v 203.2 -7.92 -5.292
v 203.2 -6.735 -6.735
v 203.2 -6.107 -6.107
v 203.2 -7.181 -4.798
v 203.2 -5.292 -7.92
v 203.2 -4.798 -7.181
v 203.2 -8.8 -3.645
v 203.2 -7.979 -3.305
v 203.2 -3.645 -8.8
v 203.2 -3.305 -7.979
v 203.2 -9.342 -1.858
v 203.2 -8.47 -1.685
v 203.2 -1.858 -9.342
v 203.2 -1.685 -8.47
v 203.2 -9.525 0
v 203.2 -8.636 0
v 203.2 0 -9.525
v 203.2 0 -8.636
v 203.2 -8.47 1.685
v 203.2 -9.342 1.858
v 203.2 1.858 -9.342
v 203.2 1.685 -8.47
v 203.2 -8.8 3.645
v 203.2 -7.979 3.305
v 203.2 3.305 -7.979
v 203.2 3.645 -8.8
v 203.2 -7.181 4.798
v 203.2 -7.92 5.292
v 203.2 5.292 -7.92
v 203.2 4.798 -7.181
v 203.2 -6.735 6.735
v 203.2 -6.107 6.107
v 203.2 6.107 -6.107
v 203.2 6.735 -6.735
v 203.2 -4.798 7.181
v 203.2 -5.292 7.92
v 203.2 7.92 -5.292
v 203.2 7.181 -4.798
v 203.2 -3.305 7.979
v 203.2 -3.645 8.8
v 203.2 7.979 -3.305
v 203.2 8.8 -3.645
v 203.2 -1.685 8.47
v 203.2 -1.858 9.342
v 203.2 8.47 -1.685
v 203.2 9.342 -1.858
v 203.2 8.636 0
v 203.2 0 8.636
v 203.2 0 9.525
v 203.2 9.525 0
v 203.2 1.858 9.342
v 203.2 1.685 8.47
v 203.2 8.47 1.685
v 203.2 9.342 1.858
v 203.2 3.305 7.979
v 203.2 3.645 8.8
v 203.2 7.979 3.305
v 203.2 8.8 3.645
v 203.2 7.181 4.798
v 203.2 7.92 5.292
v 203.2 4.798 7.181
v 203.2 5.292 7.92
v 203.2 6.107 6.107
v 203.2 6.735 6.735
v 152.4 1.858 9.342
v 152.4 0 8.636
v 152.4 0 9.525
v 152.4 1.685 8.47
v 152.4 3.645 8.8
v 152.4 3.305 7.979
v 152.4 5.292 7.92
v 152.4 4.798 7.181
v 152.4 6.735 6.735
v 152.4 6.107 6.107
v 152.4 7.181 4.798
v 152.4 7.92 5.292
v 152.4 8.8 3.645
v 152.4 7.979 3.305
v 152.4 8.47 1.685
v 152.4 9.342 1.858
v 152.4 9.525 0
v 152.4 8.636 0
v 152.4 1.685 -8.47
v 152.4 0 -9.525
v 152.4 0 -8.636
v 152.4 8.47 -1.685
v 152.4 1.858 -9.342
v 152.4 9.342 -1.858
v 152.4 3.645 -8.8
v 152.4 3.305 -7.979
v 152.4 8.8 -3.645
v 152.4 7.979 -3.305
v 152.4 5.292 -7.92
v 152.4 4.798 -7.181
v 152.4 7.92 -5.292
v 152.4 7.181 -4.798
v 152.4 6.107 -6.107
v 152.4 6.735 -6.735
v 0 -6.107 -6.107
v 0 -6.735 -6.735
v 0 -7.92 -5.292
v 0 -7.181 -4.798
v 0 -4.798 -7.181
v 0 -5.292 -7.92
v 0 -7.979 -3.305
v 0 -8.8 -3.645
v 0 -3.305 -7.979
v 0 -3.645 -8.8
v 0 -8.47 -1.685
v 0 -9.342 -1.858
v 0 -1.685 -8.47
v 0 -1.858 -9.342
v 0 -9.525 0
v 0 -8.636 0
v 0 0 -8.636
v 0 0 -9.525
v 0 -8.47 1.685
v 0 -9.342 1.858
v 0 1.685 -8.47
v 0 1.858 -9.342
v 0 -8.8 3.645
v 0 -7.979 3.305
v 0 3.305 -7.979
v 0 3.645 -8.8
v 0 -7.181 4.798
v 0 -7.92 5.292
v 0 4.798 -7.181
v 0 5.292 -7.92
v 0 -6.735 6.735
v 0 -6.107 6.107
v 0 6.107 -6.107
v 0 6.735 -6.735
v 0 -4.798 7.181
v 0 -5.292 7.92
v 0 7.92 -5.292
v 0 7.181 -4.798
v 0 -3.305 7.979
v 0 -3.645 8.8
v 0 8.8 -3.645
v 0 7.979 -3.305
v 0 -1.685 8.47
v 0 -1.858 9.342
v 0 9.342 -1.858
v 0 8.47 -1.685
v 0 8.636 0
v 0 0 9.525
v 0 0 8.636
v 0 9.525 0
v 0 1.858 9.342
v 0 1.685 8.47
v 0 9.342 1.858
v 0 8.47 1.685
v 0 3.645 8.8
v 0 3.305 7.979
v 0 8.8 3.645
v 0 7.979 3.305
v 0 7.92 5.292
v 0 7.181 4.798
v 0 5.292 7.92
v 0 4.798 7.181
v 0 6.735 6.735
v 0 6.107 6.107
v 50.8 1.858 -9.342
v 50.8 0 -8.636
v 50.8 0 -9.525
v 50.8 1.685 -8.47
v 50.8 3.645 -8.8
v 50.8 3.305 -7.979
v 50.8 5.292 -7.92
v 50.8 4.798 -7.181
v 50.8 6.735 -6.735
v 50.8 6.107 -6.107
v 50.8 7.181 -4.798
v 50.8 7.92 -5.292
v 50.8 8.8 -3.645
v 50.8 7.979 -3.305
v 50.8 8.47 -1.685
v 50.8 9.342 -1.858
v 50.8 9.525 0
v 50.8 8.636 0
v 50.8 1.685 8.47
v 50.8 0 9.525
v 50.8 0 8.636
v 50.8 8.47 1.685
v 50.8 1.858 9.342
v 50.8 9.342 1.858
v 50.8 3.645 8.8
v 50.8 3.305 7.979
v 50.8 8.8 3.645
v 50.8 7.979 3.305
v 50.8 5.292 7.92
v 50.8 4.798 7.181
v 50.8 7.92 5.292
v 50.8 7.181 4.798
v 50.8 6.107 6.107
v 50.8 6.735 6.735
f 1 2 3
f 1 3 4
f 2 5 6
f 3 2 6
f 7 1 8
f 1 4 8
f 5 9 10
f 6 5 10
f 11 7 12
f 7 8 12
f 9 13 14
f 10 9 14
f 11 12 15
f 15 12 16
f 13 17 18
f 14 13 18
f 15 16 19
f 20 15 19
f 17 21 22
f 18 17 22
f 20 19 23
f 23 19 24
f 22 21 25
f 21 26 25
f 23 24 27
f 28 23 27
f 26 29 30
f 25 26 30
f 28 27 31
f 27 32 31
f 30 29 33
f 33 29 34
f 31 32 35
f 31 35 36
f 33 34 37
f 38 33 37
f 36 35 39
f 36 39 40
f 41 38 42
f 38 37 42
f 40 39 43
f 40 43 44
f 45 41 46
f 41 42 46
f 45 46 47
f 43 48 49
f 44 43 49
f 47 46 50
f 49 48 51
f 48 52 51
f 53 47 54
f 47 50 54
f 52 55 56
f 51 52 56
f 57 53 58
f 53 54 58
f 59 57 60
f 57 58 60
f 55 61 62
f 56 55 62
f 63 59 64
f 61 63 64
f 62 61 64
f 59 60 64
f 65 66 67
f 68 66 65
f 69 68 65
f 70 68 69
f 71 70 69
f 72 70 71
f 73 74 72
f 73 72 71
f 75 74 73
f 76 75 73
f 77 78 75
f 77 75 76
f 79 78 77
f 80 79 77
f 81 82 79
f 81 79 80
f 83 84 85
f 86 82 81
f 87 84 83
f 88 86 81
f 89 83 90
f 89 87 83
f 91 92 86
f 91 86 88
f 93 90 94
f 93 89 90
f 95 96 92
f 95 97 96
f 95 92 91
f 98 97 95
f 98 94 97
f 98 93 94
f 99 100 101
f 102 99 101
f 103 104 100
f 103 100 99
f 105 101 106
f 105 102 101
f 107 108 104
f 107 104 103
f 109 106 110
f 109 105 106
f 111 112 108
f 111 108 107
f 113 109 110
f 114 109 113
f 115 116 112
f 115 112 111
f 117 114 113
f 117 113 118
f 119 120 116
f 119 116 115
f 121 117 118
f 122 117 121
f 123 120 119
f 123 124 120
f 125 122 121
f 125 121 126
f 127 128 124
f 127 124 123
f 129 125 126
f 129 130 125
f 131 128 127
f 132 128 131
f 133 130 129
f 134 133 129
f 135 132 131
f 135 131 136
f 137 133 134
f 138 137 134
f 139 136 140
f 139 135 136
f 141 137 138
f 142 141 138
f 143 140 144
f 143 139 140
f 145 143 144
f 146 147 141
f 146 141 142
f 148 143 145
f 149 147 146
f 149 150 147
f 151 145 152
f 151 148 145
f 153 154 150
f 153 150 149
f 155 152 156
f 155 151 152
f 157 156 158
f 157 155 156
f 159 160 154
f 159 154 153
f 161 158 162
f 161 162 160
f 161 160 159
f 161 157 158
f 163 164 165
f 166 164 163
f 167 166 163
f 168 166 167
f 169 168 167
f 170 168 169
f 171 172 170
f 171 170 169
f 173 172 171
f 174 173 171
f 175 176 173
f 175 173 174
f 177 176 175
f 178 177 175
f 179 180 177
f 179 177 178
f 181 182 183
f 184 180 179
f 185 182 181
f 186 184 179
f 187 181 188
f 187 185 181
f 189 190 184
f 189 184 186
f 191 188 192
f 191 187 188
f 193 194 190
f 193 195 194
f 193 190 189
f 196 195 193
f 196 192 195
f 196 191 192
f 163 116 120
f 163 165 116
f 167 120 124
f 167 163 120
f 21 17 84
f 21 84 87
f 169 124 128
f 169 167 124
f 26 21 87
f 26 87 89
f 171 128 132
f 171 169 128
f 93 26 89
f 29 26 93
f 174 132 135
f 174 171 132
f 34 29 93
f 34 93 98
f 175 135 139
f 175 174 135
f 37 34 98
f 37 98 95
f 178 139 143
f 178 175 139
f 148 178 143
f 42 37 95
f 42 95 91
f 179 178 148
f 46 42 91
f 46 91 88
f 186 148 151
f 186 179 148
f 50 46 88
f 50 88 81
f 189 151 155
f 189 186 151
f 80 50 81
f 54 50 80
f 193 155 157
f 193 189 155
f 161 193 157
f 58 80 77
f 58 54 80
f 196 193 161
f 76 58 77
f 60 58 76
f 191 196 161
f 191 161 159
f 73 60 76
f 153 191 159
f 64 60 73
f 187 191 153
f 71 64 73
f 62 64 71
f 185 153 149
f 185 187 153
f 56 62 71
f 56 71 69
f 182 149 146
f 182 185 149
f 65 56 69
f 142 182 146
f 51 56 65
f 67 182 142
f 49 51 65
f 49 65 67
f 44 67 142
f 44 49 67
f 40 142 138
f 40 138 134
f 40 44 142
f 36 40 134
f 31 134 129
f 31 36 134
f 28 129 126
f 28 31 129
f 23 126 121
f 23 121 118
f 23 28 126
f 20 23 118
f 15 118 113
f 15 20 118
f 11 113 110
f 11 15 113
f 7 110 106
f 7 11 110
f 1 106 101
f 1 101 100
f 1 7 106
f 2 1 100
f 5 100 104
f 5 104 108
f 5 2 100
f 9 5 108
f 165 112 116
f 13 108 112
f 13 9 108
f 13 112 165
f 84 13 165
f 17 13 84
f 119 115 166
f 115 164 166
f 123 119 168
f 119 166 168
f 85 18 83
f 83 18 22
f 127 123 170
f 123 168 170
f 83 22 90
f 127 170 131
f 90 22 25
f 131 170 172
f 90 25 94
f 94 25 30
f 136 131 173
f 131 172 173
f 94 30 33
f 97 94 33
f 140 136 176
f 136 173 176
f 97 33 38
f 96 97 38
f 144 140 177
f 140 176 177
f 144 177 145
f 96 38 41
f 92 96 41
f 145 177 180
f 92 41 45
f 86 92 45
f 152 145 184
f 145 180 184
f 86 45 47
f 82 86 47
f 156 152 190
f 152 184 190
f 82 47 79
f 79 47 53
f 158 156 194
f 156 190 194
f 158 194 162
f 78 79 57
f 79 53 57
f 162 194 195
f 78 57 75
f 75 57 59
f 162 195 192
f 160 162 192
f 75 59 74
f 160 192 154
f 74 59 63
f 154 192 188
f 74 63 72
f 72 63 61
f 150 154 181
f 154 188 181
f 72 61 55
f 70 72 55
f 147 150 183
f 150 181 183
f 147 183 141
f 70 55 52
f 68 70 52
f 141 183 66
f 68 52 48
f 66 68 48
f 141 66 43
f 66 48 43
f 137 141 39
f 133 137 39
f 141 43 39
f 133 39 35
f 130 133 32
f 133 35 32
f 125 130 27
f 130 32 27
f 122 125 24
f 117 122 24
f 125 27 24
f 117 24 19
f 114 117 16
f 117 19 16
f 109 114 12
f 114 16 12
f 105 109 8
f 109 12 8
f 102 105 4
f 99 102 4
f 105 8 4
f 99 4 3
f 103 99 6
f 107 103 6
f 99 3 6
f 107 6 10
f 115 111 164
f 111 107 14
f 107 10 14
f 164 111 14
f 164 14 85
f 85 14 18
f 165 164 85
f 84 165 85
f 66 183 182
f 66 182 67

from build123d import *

# Parameters (mm, degrees)
SKETCH1_W               = 203.2
SKETCH1_H               = 0.889
SKETCH2_W               = 101.6
SKETCH2_H               = 16.721370504
CUT_EXTRUDE1_DEPTH      = 10.525
CUT_EXTRUDE1_DEPTH_BACK = 10.525


with BuildPart() as part:
    # Sketch1 → Revolve1 (revolve)
    with BuildSketch(Plane(origin=(0, 0, 0), x_dir=(1, 0, 0), z_dir=(0, 1, 0))):
        with Locations((101.6, 9.0805)):
            Rectangle(SKETCH1_W, SKETCH1_H)
    revolve(axis=Axis((0, 0, 0), (1, 0, 0)))

    # Sketch2 → Cut-Extrude1 (cut, two sides)
    with BuildSketch(Plane.XY) as cut_extrude1_sk:
        with Locations((101.6, 8.360685252)):
            Rectangle(SKETCH2_W, SKETCH2_H)
    extrude(amount=CUT_EXTRUDE1_DEPTH, mode=Mode.SUBTRACT)
    extrude(cut_extrude1_sk.sketch, amount=-CUT_EXTRUDE1_DEPTH_BACK, mode=Mode.SUBTRACT)


solid = part.part
